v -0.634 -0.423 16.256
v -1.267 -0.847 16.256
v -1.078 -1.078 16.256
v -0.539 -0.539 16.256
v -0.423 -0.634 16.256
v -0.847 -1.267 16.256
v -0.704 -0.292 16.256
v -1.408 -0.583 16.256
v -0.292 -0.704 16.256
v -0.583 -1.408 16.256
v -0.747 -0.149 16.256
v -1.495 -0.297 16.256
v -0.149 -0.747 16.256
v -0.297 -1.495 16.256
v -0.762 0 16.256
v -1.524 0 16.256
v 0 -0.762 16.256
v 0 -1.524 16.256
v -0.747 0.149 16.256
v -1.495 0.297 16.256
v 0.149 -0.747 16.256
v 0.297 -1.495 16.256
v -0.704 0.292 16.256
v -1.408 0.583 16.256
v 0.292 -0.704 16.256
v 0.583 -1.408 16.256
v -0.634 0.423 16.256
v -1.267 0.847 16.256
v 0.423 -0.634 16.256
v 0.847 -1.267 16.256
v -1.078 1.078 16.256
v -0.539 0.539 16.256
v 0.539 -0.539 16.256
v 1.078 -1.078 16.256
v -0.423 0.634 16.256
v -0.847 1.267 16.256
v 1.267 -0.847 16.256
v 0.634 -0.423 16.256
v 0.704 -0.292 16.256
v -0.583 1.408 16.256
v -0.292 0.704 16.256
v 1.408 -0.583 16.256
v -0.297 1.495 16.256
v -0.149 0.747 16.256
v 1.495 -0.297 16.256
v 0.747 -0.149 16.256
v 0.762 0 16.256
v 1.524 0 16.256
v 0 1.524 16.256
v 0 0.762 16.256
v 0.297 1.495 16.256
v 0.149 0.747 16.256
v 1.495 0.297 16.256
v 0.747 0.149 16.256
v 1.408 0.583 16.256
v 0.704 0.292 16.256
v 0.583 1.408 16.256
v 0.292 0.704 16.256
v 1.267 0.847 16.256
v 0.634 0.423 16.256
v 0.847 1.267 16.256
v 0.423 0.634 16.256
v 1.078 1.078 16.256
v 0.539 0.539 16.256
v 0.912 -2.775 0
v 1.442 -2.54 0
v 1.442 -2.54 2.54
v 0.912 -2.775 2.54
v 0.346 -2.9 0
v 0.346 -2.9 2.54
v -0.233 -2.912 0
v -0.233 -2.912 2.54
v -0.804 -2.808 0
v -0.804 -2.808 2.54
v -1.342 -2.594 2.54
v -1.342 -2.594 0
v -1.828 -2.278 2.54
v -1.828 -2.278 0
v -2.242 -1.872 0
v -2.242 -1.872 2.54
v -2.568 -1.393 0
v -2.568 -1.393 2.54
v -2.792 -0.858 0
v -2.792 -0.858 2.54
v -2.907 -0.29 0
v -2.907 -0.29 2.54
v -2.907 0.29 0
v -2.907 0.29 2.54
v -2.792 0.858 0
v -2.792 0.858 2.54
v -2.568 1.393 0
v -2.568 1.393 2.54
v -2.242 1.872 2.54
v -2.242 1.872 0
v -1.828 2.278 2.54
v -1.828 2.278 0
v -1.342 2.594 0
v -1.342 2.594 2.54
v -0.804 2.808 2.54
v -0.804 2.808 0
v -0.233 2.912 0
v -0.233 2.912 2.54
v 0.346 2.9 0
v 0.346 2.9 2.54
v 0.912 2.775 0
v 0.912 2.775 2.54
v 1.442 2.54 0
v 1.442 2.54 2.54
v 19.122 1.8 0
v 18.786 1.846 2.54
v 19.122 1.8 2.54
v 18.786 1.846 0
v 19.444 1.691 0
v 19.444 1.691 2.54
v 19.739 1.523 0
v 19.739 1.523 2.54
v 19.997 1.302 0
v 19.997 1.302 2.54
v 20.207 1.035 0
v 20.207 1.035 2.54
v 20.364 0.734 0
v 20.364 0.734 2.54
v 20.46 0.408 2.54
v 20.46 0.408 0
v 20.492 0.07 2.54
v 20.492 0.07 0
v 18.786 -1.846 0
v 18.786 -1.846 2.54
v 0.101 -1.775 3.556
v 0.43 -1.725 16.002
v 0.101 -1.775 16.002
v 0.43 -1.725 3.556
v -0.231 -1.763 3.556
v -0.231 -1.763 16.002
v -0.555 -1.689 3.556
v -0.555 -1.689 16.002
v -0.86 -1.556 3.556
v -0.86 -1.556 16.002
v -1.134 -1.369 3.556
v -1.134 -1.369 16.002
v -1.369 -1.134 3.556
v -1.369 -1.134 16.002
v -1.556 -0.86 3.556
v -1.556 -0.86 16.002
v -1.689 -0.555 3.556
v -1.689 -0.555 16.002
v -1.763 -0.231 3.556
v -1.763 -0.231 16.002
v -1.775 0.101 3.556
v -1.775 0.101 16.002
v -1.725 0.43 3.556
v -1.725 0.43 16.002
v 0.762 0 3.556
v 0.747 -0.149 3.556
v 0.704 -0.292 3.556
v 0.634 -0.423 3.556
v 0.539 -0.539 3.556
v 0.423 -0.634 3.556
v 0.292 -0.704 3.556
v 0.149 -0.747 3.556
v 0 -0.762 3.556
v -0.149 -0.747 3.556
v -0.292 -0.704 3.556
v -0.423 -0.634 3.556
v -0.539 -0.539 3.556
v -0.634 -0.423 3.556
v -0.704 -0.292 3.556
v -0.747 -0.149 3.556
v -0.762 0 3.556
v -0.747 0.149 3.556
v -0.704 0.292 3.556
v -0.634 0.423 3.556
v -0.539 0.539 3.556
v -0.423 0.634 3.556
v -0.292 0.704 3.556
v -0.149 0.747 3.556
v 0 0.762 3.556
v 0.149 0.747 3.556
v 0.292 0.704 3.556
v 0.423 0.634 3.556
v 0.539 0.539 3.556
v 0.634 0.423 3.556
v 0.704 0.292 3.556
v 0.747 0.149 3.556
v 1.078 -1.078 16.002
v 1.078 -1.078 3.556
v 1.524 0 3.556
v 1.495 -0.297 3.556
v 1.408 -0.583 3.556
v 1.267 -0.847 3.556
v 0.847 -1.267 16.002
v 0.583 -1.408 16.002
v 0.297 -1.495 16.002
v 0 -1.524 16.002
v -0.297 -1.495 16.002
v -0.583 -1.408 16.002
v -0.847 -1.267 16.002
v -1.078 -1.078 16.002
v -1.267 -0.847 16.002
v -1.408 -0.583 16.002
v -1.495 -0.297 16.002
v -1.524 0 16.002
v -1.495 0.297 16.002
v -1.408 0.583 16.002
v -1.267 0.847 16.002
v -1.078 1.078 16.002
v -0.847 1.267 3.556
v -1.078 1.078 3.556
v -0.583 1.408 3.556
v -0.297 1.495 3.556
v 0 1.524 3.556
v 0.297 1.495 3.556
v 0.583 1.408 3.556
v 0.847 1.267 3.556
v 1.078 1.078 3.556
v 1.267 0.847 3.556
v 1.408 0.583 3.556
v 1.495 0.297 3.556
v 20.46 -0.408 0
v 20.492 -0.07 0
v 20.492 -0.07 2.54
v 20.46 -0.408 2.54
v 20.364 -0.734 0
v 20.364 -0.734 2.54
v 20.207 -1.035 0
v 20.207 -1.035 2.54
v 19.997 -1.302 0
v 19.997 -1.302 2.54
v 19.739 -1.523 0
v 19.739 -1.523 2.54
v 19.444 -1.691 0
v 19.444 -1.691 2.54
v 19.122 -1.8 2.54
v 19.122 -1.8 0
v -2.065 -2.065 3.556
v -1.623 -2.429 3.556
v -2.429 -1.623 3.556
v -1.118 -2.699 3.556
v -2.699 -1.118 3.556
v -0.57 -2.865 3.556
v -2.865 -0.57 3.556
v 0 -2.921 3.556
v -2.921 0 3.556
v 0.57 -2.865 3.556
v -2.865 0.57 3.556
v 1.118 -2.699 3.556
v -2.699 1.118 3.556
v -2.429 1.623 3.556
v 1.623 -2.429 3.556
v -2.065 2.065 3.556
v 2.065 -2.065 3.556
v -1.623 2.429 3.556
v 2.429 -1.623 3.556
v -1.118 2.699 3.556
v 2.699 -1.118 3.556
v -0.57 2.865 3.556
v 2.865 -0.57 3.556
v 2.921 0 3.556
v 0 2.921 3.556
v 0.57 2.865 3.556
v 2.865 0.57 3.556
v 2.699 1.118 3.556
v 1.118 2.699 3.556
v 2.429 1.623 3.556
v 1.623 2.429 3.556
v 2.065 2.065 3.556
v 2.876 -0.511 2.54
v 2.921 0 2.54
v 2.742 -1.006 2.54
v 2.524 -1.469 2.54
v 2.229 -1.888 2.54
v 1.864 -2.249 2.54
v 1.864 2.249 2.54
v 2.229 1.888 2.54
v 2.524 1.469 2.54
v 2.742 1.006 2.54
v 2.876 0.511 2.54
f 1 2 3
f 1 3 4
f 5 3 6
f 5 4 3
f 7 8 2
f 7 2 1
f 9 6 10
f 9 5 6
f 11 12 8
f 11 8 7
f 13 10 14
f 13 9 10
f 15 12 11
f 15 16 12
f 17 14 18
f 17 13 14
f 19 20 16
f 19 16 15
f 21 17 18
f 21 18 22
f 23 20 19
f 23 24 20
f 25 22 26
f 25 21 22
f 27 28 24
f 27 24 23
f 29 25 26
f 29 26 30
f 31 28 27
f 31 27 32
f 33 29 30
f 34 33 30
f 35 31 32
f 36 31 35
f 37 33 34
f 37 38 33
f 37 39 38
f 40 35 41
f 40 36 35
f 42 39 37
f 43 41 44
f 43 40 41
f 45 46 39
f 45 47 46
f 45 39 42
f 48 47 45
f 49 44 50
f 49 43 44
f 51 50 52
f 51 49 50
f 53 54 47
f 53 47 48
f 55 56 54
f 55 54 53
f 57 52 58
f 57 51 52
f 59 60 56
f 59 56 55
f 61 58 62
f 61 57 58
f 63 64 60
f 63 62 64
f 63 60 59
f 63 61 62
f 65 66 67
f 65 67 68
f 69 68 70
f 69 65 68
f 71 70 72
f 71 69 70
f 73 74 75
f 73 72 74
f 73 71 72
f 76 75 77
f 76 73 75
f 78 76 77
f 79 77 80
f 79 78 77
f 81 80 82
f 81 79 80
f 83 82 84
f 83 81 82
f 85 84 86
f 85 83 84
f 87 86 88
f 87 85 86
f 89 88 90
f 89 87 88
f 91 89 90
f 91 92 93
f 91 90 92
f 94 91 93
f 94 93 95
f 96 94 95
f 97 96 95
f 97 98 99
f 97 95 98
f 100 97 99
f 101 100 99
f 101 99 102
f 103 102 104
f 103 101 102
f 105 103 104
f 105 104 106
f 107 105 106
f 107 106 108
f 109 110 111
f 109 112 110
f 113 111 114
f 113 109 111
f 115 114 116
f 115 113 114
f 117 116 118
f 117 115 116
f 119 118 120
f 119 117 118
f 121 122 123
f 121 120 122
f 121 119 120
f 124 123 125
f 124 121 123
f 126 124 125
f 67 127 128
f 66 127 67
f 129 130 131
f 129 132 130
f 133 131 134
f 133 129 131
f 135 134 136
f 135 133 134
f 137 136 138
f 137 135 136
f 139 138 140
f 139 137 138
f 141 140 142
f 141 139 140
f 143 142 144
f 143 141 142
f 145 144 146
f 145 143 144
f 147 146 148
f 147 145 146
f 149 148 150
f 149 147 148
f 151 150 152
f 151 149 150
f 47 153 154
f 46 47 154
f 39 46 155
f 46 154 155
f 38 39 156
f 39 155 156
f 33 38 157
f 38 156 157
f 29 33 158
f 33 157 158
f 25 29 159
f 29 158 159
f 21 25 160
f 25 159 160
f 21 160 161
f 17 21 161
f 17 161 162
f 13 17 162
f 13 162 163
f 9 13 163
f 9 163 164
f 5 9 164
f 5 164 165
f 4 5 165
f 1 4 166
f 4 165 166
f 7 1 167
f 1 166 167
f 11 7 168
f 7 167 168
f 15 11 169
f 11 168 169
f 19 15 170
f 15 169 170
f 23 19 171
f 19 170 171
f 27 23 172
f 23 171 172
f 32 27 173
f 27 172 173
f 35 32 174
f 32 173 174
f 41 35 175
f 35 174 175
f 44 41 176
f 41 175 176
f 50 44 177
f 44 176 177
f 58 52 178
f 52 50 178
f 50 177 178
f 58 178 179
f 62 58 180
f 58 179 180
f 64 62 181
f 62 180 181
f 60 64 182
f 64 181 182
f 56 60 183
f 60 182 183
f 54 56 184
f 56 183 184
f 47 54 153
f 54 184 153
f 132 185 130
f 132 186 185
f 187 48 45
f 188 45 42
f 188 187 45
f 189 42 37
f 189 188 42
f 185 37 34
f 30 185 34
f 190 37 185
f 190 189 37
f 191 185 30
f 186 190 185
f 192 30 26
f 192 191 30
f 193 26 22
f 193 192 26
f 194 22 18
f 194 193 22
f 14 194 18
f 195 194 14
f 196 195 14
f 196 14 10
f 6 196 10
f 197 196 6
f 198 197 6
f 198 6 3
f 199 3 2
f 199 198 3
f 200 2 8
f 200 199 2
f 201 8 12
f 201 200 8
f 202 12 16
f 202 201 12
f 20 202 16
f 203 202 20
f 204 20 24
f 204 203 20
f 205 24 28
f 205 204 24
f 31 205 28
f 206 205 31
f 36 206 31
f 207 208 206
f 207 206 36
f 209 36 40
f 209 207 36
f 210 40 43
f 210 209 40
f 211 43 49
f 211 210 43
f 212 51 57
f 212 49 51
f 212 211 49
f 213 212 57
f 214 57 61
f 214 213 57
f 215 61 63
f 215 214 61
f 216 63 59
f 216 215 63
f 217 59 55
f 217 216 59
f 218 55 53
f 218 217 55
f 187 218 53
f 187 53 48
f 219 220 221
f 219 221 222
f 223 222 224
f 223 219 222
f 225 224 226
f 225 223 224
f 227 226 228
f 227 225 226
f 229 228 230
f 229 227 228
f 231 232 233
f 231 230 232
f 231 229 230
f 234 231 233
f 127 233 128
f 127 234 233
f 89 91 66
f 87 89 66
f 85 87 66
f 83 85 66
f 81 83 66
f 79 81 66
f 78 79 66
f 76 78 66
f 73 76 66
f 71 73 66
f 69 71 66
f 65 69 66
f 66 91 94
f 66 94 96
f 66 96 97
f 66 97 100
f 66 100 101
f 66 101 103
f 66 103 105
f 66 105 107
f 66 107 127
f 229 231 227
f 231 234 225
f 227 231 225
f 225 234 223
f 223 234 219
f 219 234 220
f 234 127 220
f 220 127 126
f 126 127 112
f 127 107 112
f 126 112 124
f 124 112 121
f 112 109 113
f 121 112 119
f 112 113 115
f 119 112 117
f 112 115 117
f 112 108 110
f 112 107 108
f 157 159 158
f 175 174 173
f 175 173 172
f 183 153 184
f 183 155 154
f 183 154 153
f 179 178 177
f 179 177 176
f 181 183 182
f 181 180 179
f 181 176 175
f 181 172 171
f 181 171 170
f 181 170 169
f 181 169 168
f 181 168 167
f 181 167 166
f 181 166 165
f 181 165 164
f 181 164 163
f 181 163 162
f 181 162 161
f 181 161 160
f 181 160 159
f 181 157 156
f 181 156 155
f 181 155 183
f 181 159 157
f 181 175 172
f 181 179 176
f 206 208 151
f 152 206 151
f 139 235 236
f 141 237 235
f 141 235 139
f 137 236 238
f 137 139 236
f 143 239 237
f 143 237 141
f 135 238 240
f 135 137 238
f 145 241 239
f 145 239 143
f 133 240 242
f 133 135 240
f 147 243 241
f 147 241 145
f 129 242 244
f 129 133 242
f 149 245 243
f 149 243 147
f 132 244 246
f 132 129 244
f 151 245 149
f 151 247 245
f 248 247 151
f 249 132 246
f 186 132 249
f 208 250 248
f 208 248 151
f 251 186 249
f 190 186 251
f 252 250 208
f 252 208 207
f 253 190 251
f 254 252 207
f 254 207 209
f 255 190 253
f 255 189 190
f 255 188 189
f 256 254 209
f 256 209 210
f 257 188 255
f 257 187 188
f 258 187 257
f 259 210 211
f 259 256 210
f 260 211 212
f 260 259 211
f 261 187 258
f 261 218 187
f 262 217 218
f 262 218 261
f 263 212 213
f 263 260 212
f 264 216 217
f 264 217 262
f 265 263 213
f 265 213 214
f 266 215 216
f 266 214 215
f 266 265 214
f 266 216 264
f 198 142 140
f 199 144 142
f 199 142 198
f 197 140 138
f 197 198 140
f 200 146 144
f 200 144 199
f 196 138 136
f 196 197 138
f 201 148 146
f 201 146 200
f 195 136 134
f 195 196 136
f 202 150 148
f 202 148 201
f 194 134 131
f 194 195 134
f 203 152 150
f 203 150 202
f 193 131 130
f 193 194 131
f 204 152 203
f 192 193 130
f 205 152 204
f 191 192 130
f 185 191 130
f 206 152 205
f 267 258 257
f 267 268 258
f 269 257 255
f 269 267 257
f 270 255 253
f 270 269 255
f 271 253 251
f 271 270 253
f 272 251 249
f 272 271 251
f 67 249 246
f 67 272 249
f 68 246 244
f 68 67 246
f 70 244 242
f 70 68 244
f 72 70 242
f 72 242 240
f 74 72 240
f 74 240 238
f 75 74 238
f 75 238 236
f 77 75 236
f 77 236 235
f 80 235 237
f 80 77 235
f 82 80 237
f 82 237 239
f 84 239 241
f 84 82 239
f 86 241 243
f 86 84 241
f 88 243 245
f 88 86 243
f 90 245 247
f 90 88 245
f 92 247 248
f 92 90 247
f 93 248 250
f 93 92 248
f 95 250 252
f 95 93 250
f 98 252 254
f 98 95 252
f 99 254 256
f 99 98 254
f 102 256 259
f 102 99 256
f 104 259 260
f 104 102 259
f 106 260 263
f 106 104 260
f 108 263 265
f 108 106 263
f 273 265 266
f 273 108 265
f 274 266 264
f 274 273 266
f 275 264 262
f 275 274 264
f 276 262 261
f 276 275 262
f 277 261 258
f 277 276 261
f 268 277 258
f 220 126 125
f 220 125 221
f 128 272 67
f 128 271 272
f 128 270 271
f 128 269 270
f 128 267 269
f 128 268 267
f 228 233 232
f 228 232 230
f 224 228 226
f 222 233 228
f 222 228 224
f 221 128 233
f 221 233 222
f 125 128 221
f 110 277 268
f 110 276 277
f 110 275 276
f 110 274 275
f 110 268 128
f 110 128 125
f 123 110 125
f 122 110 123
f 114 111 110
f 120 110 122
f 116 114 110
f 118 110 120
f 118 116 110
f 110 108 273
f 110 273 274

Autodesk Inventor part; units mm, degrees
ref_plane "YZ Plane" through (0, 0, 0) normal (1, 0, 0) x (0, 1, 0)
ref_plane "XZ Plane" through (0, 0, 0) normal (0, 1, 0) x (-1, 0, 0)
ref_plane "XY Plane" through (0, 0, 0) normal (0, 0, 1) x (1, 0, 0)
sketch "Sketch1" plane through (0, 0, 0) normal (0, 0, 1) x (1, 0, 0)
  arc A0 (1.4424, 2.54) -> (1.4424, -2.54) centre (0, 0) ccw
  line L0 (1.4424, 2.54) -> (18.7855, 1.8463)
  line L1 (18.7855, -1.8463) -> (1.4424, -2.54)
  line L2 (20.4924, 0.0697) -> (20.4924, -0.0697)
  arc A1 (18.7855, -1.8463) -> (20.4924, -0.0697) centre (18.7144, -0.0697) ccw
  arc A2 (20.4924, 0.0697) -> (18.7855, 1.8463) centre (18.7144, 0.0697) ccw
  point P0 (20.4924, 1.778)
  point P1 (20.4924, -1.778)
  point P2 (20.4924, 0)
  dimension "d0" = 5.842
  dimension "d1" = 5.08
  dimension "d2" = 3.556
  dimension "d3" = 1.778
  dimension "d4" = 19.05
  dimension "d5" = 1.778
extrude "Extrusion1" add sketch "Sketch1" along normal blind 2.54
sketch "Sketch2" plane through (0, 0, 2.54) normal (0, 0, 1) x (1, 0, 0)
  circle A0 centre (0, 0) radius 2.921
extrude "Extrusion2" add sketch "Sketch2" along normal blind 1.016
sketch "Sketch3" plane through (0, 0, 3.556) normal (0, 0, 1) x (1, 0, 0)
  circle A0 centre (0, 0) radius 0.762
  circle A1 centre (0, 0) radius 1.524
  dimension "d10" = 1.524
  dimension "d11" = 0.762
extrude "Extrusion3" add sketch "Sketch3" along normal blind 12.7
sketch "Sketch4" plane through (0, 0, 3.556) normal (0, 0, 1) x (1, 0, 0)
  circle A0 centre (0, 0) radius 1.524 projected
  line L0 (-1.0776, 1.0776) -> (-1.7252, 0.4301)
  line L1 (1.0776, -1.0776) -> (0.4301, -1.7252)
  arc A1 (-1.7252, 0.4301) -> (0.4301, -1.7252) centre (0, 0) ccw
  arc A2 (-1.0776, 1.0776) -> (1.0776, -1.0776) centre (0, 0) ccw
  dimension "d17" = 3.302
extrude "Extrusion5" add sketch "Sketch4" along normal blind 12.446 contours A0 L1 A1 L0
properties part number "Right leg distributor" material "Phenolic Resin"
